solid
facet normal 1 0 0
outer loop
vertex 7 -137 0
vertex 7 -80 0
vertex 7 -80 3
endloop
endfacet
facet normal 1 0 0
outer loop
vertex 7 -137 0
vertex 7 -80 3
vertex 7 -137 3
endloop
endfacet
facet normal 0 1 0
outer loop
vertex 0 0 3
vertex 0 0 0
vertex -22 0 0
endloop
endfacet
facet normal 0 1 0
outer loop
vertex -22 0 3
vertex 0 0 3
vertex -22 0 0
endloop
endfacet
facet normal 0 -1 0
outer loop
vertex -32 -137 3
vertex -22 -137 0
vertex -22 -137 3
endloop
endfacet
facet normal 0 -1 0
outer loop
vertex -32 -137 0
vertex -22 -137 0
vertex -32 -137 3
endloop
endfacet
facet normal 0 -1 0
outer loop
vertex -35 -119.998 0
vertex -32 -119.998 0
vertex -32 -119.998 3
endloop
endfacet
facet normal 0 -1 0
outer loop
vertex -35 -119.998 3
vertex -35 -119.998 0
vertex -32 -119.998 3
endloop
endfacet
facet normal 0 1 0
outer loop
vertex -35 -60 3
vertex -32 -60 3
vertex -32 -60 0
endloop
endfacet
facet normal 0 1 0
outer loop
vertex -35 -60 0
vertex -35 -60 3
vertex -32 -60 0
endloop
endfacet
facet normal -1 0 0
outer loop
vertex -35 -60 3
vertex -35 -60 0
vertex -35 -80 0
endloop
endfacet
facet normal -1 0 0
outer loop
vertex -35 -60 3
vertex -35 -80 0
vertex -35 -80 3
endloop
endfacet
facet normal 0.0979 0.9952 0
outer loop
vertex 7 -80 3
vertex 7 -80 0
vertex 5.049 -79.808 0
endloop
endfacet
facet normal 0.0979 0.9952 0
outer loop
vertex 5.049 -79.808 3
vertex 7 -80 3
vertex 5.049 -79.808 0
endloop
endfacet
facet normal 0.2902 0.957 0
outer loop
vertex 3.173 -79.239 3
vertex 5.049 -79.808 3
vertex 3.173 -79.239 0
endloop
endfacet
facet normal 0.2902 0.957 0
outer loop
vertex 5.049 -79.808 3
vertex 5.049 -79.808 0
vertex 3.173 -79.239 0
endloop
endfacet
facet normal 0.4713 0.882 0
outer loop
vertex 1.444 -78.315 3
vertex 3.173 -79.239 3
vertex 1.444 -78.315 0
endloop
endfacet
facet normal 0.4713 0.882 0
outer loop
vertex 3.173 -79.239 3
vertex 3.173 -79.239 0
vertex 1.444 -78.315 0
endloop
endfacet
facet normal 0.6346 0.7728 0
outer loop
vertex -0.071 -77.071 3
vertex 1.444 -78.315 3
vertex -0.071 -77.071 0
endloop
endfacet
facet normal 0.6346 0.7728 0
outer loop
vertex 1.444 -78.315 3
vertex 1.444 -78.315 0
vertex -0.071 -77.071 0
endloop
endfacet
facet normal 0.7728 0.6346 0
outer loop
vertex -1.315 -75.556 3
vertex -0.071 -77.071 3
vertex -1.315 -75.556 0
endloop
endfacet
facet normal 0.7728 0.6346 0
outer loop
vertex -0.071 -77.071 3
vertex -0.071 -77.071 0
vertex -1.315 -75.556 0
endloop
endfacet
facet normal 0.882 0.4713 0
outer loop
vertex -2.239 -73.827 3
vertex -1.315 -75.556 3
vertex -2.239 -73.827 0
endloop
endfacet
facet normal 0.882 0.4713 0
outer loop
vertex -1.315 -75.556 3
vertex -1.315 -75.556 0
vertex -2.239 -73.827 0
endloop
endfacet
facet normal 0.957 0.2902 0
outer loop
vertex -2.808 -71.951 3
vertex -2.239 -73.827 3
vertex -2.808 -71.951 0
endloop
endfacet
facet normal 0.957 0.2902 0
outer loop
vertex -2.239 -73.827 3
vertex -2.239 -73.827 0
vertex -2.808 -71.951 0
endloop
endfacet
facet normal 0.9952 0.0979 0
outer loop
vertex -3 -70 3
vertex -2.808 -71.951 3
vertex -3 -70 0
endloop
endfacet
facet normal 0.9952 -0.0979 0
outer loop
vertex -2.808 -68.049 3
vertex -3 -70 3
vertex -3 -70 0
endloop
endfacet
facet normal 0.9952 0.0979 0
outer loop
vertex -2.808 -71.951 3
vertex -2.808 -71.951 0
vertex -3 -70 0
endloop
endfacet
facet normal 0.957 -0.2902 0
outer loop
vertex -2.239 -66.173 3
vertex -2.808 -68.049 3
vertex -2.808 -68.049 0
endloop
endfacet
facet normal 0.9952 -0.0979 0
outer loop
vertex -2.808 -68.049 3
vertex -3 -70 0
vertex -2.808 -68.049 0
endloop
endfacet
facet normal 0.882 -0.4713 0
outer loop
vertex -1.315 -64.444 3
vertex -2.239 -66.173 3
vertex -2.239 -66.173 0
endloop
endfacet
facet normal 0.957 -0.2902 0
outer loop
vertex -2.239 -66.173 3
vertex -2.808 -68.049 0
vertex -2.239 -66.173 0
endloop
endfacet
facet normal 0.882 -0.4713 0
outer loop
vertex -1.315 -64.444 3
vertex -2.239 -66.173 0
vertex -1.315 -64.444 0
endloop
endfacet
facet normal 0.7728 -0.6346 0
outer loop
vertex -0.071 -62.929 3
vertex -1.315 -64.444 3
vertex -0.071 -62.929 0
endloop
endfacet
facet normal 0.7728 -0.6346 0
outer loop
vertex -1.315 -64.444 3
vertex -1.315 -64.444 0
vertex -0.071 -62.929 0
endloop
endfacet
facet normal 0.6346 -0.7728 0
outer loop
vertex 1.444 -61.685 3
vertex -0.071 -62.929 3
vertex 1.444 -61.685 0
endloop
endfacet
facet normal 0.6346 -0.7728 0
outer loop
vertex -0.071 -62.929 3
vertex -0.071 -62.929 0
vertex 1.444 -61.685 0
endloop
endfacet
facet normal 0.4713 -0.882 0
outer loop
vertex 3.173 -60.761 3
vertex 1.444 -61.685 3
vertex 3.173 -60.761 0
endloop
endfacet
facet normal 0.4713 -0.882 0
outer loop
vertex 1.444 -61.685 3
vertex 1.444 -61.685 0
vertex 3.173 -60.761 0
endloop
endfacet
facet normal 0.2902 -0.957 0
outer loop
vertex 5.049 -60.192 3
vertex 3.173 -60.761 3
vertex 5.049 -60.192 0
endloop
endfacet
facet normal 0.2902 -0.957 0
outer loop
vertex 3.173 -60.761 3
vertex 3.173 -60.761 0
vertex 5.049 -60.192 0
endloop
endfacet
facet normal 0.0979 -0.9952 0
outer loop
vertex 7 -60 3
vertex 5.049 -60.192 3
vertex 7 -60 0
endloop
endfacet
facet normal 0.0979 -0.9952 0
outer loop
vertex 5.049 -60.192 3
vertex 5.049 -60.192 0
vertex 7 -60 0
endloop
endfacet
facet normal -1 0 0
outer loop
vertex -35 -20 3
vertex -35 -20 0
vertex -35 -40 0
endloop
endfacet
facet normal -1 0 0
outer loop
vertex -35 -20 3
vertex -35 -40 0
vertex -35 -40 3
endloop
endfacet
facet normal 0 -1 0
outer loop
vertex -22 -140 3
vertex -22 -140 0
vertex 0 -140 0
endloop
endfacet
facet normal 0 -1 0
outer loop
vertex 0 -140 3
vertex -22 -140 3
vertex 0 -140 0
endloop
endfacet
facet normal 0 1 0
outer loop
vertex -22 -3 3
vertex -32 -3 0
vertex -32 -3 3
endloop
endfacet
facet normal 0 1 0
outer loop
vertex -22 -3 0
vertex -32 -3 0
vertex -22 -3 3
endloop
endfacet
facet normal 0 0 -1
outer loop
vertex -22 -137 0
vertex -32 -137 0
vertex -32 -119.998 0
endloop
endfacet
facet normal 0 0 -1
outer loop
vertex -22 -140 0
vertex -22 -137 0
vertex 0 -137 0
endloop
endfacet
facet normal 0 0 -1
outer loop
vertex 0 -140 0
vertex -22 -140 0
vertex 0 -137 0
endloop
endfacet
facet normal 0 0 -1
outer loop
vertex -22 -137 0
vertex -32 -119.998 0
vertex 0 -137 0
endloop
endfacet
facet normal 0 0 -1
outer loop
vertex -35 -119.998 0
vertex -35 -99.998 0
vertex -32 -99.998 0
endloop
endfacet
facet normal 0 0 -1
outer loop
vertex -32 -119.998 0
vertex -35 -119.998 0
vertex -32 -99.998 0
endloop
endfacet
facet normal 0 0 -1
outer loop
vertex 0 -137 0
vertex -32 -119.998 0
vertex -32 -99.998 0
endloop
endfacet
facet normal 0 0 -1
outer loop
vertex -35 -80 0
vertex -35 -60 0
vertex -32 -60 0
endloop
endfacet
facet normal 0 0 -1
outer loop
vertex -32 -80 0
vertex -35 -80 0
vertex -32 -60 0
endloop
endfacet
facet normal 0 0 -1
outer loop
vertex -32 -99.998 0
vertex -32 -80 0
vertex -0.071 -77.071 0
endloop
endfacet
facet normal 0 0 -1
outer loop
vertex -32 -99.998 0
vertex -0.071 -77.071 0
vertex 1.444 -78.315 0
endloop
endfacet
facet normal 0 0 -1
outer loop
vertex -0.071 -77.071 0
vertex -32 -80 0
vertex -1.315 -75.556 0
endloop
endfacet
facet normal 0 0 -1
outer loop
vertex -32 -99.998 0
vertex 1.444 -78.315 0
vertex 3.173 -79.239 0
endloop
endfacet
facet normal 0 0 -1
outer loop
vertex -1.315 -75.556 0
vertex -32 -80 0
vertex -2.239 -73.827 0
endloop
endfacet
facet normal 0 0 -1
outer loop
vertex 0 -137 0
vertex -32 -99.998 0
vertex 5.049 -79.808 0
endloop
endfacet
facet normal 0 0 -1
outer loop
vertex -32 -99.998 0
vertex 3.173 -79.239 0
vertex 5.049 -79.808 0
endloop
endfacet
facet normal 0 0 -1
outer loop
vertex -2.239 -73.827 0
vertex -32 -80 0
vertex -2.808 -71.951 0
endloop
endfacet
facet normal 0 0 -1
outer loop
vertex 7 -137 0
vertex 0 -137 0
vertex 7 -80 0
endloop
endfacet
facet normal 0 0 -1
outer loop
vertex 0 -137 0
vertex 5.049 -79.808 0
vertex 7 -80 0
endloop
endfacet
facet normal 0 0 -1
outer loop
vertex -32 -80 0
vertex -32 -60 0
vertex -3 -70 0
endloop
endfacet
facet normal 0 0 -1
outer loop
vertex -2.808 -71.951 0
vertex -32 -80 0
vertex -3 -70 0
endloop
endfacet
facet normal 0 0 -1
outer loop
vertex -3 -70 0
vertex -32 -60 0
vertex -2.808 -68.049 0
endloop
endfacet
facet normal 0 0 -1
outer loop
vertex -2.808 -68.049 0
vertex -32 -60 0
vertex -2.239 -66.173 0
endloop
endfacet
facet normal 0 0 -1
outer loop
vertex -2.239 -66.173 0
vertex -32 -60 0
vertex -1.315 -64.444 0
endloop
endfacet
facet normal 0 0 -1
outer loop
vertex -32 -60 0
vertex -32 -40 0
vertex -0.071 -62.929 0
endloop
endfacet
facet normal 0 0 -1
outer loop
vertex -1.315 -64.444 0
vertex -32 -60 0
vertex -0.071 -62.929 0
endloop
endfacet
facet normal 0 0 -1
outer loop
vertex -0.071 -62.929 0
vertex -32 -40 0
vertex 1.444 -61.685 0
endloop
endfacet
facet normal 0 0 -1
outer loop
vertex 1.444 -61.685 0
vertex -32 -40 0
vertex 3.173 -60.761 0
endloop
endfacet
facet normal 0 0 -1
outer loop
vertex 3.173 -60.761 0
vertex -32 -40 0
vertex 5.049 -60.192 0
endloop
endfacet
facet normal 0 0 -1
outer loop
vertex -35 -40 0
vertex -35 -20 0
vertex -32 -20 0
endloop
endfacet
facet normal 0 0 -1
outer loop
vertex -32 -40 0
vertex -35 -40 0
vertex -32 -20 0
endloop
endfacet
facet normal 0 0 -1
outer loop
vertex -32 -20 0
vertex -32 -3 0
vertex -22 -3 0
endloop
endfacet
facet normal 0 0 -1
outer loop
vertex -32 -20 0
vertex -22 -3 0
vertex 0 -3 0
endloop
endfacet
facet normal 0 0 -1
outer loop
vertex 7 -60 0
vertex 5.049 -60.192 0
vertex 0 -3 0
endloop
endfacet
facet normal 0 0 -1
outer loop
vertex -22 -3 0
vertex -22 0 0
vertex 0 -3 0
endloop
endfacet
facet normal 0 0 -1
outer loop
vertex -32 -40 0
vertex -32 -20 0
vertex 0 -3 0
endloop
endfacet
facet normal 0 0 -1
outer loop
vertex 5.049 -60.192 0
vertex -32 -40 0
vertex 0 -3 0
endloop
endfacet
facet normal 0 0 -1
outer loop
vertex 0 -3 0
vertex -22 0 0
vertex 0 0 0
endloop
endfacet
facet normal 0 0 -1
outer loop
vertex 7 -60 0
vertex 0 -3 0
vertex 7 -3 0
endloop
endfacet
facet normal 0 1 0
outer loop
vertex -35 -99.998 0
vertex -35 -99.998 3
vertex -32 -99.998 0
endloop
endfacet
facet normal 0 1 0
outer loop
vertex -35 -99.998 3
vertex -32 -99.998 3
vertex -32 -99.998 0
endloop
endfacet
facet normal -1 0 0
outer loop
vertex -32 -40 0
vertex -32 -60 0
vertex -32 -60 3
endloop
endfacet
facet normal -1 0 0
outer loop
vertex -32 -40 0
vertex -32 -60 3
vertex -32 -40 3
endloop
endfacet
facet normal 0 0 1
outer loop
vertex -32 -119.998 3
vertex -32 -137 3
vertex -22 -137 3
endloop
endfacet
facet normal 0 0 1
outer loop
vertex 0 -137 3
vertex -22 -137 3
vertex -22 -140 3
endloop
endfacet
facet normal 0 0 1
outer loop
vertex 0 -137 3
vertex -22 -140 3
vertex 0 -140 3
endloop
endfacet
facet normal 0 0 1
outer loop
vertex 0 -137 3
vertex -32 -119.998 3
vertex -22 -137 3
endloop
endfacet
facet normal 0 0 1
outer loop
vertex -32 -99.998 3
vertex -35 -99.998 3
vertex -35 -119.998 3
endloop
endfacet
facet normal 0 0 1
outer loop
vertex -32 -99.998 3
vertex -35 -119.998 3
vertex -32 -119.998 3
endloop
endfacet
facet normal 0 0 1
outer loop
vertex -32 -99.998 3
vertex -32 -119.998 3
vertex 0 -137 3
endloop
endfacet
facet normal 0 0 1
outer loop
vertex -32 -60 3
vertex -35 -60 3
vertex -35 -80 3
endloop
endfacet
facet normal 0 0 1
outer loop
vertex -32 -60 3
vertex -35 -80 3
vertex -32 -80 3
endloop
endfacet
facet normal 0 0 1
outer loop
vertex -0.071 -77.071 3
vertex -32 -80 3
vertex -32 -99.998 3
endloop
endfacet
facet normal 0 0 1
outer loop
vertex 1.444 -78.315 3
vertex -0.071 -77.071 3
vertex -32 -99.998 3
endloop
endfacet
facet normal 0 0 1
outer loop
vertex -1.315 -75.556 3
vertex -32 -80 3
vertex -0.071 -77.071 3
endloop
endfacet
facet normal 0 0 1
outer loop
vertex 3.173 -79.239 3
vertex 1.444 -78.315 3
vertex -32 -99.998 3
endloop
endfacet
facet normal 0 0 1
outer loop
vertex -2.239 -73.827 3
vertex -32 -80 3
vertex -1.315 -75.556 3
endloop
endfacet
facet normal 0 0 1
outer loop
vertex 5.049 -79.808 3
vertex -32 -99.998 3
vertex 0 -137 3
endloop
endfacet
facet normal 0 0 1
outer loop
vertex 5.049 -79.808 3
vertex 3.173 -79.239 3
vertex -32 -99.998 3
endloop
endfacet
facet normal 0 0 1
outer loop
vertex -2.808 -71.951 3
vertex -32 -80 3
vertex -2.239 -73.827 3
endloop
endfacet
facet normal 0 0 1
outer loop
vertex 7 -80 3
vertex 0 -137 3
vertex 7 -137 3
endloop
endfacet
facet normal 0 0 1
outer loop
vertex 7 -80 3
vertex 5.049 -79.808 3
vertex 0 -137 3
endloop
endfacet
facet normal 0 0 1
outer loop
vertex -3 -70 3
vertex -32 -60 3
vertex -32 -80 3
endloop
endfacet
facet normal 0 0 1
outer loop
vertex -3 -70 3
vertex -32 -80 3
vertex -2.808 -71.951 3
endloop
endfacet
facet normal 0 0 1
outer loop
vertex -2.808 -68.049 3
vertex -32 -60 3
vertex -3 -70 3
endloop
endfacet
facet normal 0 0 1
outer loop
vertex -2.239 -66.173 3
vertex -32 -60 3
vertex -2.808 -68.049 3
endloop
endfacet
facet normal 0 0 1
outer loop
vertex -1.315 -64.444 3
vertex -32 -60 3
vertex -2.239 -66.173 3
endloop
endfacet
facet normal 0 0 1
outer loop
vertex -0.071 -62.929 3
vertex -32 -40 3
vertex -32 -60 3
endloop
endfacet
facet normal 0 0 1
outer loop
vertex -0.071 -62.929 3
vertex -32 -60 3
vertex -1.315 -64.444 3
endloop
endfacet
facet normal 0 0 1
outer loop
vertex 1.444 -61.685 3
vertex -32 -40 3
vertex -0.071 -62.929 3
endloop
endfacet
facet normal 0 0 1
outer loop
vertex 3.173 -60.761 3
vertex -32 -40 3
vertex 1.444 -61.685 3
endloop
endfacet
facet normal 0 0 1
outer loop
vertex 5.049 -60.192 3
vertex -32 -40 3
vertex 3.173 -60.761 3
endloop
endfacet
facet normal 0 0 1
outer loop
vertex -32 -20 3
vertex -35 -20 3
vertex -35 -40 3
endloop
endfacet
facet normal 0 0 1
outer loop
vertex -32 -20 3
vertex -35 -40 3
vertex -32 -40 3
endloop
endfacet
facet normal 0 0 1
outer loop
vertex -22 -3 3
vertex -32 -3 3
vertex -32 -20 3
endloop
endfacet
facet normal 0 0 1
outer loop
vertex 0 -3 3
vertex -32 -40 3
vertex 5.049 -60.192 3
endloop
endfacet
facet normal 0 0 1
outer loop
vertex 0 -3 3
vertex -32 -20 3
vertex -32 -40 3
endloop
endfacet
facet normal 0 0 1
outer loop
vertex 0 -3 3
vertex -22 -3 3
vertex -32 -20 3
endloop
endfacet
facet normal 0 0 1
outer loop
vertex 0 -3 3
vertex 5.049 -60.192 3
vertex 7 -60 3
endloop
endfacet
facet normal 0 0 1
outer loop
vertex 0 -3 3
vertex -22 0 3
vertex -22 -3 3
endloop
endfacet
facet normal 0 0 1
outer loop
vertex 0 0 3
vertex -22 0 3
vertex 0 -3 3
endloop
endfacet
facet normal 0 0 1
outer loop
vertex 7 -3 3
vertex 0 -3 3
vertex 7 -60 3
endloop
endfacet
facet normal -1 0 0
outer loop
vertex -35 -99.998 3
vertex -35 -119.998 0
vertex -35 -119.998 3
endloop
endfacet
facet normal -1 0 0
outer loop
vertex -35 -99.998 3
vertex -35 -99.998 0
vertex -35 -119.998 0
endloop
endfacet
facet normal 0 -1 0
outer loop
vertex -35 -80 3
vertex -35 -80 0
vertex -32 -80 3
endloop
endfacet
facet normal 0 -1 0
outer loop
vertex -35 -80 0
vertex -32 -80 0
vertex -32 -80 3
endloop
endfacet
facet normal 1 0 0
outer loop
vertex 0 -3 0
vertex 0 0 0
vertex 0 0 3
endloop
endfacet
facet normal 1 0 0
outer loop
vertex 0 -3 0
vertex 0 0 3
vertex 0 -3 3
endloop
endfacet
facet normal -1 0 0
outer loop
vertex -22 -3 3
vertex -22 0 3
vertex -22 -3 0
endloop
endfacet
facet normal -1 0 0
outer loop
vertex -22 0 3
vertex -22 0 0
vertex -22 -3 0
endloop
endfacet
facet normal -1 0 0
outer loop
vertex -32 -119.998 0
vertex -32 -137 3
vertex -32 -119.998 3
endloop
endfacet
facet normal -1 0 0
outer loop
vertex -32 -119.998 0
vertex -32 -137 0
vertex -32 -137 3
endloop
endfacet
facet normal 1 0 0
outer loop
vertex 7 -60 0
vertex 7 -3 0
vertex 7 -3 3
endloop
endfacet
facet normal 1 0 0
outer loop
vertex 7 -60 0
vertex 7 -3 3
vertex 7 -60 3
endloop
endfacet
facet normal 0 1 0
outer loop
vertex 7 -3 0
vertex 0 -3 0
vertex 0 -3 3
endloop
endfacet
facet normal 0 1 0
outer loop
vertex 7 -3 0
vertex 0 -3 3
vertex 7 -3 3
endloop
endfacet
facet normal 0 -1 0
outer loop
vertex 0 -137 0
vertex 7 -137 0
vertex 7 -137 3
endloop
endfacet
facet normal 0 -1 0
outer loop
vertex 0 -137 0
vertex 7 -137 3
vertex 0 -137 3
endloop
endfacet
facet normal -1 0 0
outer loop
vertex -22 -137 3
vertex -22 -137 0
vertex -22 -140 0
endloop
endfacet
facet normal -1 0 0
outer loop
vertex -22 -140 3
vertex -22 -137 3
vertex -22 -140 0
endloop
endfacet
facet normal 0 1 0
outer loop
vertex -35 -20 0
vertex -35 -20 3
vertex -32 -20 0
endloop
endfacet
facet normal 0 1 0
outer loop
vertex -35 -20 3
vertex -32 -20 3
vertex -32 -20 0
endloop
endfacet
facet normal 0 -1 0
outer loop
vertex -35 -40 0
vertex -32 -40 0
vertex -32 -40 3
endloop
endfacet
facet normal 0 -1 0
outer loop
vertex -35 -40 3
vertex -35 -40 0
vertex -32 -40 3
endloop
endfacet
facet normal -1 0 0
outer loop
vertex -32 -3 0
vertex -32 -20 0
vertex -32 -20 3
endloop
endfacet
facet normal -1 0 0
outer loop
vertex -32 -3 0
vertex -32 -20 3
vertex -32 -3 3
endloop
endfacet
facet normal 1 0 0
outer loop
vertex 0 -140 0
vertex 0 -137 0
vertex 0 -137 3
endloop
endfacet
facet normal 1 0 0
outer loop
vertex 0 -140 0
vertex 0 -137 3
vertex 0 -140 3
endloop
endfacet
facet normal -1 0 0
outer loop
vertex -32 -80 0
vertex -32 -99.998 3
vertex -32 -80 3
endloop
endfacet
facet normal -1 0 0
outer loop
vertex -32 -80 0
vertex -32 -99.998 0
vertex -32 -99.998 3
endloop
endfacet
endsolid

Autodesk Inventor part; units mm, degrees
ref_plane "YZ Plane" through (0, 0, 0) normal (1, 0, 0) x (0, 1, 0)
ref_plane "XZ Plane" through (0, 0, 0) normal (0, 1, 0) x (-1, 0, 0)
ref_plane "XY Plane" through (0, 0, 0) normal (0, 0, 1) x (1, 0, 0)
sketch "Sketch1" plane through (0, 0, 0) normal (0, 0, 1) x (1, 0, 0)
  line L0 (0, 0) -> (0, -3)
  line L1 (0, -3) -> (7, -3)
  line L2 (7, -3) -> (7, 0)
  line L3 (0, 0) -> (-22, 0)
  line L4 (-22, 0) -> (-22, -3)
  line L5 (-22, -3) -> (0, -3)
  line L6 (0, -3) -> (0, 0)
  line L7 (-22, 0) -> (-32, 0)
  line L8 (-32, 0) -> (-32, -3)
  line L9 (-32, -3) -> (-22, -3)
  line L10 (-22, -3) -> (-22, 0)
  line L11 (-32, 0) -> (7, 0)
  line L12 (7, 0) -> (7, -70)
  line L13 (7, -70) -> (-32, -70)
  line L14 (-32, -70) -> (-32, 0)
  circle A0 centre (7, -70) radius 10
  point P0 (-3, -70)
  point P1 (7, -60)
  dimension "d0" = 3
  dimension "d1" = 7
  dimension "d2" = 22
  dimension "d3" = 3
  dimension "d4" = 10
  dimension "d5" = 3
  dimension "d6" = 39
  dimension "d7" = 70
  dimension "d8" = 20
extrude "Extrusion1" add sketch "Sketch1" along normal blind 3 contours L0 L5 L4 L3 | L1 L12 A0 L13 L14 L9 L5
mirror "Mirror1" about plane through (-32, -70, 0) normal (0, -1, 0) of "Extrusion1"
sketch "Sketch2" plane through (-32, -3, 0) normal (-1, 0, 0) x (0, 0, 1)
  line L0 (0, 0) -> (3, 0)
  line L1 (3, 0) -> (3, -17)
  line L2 (3, -17) -> (0, -17)
  line L3 (0, -17) -> (0, 0)
  line L4 (3, -17) -> (0, -17)
  line L5 (0, -17) -> (0, -37)
  line L6 (0, -37) -> (3, -37)
  line L7 (3, -37) -> (3, -17)
  line L8 (0, -37) -> (3, -37)
  line L9 (3, -37) -> (3, -57)
  line L10 (3, -57) -> (0, -57)
  line L11 (0, -57) -> (0, -37)
  point P0 (0, 3)
  dimension "d11" = 3
  dimension "d12" = 17
  dimension "d13" = 3
  dimension "d14" = 20
  dimension "d15" = 3
  dimension "d16" = 20
extrude "Extrusion2" add sketch "Sketch2" along normal blind 3 contours L2 L7 L6 L5
sketch "Sketch3" plane through (-32, -137, 0) normal (-1, 0, 0) x (0, 0, 1)
  line L0 (0, 97) -> (3, 97)
  line L1 (3, 97) -> (3, 77)
  line L2 (3, 77) -> (0, 77)
  line L3 (0, 77) -> (0, 97)
  line L4 (3, 77) -> (0, 77)
  line L5 (0, 77) -> (0, 57)
  line L6 (0, 57) -> (3, 57)
  line L7 (3, 57) -> (3, 77)
  line L8 (0, 97) -> (0, 0) projected
  line L9 (3, 57) -> (0, 57)
  line L10 (0, 57) -> (0, 37)
  line L11 (0, 37) -> (3, 37)
  line L12 (3, 37) -> (3, 57)
  point P0 (0, 137)
  dimension "d19" = 3
  dimension "d20" = 20
  dimension "d21" = 3
  dimension "d22" = 20
  dimension "d23" = 20
extrude "Extrusion3" add sketch "Sketch3" along normal blind 3 contours L2 L7 L6 L5
sketch "Sketch4" plane through (-32, -137, 0) normal (-1, 0, 0) x (0, 0, 1)
  line L0 (2.7004, 57) -> (3, 37.0022)
  line L1 (3, 57) -> (3, 0) projected
  line L2 (0, 57) -> (0, 0) projected
  line L3 (3, 37.0022) -> (0, 37.0022)
  line L4 (0, 37.0022) -> (0, 17.0022)
  line L5 (0, 17.0022) -> (3, 17.0022)
  line L6 (3, 17.0022) -> (3, 37.0022)
  point P0 (0, 137)
  point P1 (3, 17.0022)
  point P2 (0, 37.0022)
  dimension "d26" = 20
  dimension "d27" = 20
extrude "Extrusion4" add sketch "Sketch4" along normal blind 3
properties part number "ACHTERKANT"
